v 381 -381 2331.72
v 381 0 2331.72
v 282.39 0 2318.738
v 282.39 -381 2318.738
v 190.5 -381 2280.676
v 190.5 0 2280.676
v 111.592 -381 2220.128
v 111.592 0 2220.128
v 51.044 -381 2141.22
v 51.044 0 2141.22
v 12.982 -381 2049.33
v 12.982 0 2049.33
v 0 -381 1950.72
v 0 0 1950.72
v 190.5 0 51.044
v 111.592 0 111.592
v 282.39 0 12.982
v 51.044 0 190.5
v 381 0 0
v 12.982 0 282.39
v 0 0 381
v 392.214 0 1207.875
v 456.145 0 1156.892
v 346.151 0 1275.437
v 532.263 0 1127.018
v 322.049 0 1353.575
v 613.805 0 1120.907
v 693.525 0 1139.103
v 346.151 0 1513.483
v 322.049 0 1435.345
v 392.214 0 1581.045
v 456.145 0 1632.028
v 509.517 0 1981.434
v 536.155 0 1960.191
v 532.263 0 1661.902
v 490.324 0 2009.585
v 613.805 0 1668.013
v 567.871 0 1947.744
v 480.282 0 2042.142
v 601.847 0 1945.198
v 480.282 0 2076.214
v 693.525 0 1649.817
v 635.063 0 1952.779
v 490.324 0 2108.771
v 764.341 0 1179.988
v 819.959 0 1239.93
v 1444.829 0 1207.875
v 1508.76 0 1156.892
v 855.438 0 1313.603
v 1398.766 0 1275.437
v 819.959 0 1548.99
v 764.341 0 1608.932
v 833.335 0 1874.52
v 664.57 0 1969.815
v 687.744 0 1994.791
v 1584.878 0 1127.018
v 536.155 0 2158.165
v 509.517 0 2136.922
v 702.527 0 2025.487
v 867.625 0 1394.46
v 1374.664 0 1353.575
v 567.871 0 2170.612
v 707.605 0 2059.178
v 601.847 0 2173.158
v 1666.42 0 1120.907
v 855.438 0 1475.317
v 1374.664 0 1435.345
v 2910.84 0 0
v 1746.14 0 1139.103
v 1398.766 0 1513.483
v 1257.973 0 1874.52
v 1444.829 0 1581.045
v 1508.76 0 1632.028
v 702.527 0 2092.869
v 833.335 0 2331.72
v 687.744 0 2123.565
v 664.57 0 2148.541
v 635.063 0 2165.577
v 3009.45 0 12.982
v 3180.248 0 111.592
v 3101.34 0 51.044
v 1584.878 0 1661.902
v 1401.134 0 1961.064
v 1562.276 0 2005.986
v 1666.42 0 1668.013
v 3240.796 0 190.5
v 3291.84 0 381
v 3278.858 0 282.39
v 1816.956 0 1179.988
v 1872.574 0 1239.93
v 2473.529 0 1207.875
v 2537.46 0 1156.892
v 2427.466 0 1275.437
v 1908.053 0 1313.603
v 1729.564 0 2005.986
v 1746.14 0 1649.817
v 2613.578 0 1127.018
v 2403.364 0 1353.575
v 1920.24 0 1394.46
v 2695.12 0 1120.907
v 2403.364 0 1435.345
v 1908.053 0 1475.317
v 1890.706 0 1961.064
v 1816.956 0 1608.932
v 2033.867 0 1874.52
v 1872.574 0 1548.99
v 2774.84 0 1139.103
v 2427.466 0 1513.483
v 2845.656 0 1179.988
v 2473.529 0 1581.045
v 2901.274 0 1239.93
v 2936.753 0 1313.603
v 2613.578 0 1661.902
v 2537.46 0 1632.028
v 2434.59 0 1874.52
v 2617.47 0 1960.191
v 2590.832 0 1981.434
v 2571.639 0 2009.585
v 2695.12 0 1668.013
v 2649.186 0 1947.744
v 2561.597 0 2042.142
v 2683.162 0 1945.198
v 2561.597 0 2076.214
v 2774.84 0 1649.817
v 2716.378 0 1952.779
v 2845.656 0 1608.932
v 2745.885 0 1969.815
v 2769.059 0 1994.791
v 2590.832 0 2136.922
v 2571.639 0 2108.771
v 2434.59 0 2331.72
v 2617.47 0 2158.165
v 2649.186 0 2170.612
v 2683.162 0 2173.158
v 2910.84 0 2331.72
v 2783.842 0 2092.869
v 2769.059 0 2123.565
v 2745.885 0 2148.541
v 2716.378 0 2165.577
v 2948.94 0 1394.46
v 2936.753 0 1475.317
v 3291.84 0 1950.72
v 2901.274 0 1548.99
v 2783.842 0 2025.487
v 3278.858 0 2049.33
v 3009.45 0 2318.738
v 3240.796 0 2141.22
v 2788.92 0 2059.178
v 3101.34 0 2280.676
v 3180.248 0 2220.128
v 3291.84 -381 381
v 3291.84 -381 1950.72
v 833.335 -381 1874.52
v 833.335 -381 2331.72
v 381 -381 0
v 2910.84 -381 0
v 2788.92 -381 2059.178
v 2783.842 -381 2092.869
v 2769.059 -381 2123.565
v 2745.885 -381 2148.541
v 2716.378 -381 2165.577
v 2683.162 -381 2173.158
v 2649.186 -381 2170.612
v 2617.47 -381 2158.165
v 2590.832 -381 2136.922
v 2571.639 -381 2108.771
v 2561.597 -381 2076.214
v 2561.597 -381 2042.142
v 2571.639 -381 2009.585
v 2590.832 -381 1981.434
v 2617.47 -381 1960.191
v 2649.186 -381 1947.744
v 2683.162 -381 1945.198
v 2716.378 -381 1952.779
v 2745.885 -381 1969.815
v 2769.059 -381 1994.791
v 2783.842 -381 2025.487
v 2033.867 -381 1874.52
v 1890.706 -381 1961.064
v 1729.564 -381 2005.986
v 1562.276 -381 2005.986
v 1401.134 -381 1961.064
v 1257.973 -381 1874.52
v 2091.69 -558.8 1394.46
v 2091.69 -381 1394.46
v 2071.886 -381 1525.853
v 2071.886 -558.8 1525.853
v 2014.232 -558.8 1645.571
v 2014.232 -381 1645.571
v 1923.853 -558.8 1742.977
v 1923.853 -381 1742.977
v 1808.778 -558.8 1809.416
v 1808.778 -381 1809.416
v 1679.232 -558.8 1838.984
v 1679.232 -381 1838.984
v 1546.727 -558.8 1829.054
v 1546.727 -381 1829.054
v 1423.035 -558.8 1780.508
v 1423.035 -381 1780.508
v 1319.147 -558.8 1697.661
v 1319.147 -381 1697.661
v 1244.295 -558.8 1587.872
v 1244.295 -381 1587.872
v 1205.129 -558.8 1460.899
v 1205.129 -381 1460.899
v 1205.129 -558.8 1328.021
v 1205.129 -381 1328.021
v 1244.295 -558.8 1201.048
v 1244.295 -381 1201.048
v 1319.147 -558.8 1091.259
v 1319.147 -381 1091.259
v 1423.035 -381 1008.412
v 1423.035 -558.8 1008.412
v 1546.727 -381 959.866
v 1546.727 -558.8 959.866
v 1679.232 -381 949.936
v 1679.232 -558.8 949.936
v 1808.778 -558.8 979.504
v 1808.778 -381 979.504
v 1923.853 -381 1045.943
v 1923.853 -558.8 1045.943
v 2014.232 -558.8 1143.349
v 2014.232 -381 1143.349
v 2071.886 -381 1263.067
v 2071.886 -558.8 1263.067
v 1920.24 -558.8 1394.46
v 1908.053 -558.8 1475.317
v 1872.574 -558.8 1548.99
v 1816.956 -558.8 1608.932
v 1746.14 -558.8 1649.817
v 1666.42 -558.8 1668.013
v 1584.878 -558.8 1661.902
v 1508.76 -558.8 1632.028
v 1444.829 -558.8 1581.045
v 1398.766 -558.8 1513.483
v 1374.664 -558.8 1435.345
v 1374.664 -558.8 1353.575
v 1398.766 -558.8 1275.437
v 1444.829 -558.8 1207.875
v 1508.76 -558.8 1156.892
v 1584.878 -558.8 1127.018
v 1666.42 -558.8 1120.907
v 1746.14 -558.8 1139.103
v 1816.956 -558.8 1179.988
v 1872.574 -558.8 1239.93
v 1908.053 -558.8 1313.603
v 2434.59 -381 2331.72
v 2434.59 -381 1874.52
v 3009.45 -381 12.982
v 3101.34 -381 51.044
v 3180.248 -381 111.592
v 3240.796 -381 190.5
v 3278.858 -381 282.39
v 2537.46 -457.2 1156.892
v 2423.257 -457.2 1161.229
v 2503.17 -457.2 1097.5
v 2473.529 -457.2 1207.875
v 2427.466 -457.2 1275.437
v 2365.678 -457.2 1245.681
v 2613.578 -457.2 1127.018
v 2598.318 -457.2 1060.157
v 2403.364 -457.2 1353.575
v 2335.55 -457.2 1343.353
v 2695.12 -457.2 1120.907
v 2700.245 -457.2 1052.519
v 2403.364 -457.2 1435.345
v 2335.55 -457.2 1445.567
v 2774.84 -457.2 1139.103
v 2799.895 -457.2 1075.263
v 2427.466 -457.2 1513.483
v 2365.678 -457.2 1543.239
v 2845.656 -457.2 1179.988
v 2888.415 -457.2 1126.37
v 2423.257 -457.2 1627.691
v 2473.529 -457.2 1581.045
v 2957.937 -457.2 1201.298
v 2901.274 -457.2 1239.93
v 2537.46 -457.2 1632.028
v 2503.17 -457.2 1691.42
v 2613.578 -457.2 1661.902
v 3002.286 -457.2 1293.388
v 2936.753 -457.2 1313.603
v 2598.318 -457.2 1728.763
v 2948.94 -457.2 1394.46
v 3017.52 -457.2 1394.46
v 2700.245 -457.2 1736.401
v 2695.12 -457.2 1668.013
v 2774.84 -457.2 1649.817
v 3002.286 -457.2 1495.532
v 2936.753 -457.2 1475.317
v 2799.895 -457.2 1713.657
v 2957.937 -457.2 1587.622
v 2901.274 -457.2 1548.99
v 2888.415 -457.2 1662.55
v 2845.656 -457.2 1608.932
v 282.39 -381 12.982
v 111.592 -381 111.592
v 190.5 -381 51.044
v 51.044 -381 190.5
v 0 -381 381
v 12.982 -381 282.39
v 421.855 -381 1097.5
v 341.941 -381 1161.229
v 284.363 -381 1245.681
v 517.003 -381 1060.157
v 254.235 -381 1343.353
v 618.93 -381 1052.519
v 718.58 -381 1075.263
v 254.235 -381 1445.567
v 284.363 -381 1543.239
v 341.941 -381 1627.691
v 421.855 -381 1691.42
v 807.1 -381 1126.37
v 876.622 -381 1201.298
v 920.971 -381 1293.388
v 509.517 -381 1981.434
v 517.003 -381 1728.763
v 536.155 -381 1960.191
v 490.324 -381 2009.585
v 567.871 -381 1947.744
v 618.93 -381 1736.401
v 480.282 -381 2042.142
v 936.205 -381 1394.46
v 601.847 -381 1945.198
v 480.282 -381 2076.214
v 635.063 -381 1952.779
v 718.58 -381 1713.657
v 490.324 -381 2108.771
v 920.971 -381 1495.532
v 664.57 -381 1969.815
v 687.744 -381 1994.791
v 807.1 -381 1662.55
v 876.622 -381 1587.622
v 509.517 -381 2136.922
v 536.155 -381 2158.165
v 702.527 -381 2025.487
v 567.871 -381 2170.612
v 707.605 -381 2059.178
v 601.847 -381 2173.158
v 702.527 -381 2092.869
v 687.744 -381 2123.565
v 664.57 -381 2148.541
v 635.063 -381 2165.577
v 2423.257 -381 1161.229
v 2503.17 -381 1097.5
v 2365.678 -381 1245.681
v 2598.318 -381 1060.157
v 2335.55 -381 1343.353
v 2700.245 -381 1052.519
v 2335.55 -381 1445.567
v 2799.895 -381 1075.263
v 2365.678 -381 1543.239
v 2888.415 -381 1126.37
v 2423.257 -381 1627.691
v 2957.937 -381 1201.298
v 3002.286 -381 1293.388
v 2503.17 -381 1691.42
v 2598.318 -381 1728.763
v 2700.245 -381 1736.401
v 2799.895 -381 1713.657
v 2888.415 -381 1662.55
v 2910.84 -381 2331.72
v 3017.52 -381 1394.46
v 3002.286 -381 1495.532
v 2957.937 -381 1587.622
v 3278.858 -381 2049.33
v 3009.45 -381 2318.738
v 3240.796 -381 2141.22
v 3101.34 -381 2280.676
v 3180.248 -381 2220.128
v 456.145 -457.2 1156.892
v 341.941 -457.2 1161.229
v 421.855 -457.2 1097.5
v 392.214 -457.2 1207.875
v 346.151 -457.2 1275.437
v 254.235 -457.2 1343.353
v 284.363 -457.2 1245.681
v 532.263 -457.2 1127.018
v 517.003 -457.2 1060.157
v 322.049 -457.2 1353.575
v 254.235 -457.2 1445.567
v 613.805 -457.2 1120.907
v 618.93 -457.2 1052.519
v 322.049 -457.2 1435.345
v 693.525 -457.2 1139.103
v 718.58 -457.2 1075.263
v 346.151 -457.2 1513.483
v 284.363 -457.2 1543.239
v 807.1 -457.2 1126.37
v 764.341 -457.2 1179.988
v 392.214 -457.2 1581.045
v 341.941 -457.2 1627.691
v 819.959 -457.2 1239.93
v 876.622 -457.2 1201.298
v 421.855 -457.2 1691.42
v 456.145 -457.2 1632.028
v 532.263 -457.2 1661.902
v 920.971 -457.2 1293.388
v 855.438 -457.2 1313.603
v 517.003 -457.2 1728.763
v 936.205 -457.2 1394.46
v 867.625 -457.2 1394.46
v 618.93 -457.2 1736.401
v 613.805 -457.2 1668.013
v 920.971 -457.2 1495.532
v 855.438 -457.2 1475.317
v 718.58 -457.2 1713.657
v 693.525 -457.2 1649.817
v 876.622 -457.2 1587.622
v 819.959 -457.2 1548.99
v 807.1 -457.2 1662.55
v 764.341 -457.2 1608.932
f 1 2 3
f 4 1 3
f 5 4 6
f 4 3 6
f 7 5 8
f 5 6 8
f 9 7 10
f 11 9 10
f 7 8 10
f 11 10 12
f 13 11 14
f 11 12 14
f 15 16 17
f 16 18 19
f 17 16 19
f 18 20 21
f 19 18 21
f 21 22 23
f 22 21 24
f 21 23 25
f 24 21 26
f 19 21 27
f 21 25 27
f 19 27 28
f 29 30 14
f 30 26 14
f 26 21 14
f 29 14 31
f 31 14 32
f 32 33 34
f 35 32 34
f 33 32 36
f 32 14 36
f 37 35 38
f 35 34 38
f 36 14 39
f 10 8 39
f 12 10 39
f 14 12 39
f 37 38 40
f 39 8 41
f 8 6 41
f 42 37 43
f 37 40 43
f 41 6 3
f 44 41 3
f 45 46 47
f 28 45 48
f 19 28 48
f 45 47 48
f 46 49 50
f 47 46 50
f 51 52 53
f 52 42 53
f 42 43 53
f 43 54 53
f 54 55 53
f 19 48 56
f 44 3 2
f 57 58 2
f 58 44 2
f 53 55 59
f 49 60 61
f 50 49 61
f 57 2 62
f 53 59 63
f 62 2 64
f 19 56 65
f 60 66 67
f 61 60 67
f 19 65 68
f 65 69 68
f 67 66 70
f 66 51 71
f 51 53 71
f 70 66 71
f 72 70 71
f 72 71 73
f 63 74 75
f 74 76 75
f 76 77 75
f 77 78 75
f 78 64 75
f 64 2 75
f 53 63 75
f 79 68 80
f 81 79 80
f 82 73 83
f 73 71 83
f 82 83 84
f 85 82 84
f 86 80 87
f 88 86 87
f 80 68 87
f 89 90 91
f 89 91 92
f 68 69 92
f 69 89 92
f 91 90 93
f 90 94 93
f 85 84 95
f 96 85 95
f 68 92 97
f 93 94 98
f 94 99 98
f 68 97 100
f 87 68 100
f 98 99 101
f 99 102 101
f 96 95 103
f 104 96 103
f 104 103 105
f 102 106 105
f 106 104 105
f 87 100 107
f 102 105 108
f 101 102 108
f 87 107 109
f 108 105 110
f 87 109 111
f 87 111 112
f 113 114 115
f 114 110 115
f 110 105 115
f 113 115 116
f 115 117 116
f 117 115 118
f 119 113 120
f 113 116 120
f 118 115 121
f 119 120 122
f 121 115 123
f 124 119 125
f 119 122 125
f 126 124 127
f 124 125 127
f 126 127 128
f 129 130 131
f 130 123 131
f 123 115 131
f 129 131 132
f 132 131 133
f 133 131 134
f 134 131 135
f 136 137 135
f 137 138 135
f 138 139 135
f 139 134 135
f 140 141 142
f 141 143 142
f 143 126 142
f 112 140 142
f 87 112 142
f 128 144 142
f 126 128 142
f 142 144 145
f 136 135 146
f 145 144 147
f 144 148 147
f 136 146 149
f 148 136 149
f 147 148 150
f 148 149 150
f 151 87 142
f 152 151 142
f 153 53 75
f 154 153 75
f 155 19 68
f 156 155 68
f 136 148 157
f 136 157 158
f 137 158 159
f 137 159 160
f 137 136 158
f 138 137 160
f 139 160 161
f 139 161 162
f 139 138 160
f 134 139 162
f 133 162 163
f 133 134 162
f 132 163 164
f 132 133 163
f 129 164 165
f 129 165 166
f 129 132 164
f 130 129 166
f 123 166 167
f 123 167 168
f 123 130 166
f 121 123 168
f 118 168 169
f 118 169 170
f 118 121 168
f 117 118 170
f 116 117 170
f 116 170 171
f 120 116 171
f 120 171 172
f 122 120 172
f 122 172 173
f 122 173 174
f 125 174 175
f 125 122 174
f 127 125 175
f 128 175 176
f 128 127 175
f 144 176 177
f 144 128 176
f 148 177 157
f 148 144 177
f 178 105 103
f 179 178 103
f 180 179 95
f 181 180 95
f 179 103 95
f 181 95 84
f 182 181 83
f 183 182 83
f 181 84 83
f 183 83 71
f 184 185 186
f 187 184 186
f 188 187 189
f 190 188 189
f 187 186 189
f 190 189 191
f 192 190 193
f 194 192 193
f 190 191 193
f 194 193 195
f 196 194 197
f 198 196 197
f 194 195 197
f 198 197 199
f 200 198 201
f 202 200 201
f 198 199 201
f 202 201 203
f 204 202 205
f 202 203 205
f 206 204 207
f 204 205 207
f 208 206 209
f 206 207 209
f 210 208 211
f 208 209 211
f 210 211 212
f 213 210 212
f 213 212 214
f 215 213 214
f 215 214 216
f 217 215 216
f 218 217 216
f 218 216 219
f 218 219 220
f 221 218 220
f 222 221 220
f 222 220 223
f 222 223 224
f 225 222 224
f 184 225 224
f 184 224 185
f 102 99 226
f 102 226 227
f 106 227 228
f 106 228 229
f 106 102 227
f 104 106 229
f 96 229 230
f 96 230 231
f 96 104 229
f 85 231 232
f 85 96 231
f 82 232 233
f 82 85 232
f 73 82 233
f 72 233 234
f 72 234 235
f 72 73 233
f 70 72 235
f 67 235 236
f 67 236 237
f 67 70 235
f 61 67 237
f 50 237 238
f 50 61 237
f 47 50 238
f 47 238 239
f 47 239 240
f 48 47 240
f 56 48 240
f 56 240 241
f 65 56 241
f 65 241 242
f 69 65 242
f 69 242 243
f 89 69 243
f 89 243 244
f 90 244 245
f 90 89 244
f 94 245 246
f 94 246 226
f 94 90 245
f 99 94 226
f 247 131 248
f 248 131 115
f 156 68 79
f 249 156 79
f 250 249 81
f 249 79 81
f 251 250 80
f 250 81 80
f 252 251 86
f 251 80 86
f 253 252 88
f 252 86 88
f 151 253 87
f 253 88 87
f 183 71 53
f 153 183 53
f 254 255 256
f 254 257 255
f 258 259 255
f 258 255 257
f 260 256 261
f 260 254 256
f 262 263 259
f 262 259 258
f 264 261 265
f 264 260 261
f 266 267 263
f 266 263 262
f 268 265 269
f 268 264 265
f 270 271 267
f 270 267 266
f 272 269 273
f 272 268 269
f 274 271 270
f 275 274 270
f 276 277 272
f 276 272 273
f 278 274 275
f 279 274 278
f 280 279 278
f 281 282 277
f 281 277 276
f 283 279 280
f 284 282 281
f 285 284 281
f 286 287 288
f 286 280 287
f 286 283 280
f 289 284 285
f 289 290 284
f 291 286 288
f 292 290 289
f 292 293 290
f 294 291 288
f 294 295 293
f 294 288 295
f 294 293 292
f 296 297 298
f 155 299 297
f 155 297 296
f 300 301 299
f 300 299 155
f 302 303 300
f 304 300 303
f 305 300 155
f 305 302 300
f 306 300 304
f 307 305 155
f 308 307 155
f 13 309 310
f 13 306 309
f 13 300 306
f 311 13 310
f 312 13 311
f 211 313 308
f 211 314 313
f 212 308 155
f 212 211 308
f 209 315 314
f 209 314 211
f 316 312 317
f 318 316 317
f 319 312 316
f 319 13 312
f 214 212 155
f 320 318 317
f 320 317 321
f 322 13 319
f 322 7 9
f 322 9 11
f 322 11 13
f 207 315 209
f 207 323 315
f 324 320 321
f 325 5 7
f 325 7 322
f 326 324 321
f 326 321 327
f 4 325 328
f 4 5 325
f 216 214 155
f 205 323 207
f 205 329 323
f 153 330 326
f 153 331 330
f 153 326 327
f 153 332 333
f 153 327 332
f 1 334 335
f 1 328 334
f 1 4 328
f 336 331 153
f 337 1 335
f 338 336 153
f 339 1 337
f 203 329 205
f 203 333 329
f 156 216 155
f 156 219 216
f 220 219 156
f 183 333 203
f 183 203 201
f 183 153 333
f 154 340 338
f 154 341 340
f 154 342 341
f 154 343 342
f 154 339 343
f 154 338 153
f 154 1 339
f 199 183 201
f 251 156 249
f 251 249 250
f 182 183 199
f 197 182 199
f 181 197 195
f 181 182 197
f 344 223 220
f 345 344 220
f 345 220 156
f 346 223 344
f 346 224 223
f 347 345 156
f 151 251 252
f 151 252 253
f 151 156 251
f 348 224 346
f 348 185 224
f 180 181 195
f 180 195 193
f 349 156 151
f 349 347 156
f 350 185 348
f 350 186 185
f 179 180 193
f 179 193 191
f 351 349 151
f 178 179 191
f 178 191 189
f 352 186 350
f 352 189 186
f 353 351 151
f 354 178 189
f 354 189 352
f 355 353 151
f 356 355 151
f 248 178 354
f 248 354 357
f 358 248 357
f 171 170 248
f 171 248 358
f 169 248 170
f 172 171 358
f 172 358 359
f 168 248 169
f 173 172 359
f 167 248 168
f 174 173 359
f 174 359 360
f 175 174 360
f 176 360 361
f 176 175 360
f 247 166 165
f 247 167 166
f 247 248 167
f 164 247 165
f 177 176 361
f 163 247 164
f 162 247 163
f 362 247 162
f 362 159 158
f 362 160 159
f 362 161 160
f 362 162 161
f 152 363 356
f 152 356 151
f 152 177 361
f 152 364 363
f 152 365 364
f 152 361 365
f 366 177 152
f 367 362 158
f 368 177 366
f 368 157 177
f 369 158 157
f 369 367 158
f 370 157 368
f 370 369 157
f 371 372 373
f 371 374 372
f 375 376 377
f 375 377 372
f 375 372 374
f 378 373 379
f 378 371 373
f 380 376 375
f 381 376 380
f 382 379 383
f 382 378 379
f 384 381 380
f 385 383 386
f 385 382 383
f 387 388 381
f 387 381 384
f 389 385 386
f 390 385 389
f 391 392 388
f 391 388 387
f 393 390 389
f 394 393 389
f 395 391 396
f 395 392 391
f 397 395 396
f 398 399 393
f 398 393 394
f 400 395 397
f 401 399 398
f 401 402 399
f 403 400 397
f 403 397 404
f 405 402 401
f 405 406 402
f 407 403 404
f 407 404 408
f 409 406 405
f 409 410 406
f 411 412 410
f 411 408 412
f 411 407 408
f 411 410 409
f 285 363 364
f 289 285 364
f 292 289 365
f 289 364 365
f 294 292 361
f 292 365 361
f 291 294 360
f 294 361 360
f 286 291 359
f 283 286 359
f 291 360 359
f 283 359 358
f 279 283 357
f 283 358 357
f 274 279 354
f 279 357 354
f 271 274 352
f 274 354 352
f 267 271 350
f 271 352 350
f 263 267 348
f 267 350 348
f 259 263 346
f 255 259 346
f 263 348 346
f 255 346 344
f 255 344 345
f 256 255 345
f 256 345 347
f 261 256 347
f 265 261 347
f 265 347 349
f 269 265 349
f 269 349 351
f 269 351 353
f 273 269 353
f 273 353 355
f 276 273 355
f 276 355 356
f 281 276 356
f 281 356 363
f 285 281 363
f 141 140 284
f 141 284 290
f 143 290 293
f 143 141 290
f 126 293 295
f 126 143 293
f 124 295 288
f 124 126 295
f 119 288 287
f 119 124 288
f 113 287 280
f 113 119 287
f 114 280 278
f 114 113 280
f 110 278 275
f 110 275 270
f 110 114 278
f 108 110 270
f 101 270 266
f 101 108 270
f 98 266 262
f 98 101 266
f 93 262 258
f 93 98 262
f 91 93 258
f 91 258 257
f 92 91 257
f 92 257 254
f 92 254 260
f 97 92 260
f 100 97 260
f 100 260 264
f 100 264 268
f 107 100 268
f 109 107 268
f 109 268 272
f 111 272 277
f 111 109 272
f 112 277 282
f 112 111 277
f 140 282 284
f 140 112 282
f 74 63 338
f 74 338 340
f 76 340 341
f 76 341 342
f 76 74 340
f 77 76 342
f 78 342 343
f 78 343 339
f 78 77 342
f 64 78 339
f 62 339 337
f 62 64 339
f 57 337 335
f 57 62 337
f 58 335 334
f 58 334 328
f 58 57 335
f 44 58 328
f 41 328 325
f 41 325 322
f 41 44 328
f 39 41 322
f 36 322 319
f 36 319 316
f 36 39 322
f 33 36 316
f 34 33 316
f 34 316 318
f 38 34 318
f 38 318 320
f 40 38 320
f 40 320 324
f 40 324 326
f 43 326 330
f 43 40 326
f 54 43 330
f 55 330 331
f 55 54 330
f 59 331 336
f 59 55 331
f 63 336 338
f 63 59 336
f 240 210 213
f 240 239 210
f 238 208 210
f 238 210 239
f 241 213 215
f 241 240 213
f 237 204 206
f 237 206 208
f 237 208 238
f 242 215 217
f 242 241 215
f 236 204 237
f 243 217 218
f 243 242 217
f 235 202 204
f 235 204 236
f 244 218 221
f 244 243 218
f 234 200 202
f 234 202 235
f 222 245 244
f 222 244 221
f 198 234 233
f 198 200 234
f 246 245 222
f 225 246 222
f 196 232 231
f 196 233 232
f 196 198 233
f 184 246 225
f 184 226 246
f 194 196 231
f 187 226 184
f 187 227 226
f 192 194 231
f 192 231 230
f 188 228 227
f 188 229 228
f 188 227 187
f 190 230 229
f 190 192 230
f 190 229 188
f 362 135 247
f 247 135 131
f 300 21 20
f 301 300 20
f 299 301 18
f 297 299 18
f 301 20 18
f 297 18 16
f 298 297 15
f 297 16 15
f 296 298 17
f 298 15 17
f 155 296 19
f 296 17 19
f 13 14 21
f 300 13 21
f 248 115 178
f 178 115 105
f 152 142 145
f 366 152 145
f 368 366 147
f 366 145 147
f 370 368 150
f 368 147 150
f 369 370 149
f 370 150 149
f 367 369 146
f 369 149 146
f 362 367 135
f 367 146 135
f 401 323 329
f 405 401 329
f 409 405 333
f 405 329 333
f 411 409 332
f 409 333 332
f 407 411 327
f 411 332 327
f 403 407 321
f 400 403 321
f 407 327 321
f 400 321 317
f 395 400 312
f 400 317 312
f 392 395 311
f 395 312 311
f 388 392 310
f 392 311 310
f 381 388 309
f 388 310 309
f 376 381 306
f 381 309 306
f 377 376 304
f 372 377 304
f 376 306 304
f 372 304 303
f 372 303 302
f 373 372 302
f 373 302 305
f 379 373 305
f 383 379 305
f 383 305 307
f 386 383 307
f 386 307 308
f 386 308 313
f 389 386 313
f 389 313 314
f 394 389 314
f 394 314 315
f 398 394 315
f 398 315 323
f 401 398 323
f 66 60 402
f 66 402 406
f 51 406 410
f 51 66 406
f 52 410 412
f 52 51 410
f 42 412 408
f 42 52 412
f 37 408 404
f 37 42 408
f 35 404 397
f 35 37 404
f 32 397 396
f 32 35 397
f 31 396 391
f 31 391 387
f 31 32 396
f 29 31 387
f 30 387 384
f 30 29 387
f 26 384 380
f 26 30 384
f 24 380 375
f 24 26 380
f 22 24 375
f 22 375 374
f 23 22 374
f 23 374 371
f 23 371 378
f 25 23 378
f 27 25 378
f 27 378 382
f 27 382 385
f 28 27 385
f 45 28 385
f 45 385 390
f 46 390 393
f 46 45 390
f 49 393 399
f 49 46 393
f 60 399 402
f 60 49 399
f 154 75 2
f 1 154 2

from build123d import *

# Parameters (mm, degrees)
F0_R     = 342.9
F0_R_2   = 114.3
F0_R_3   = 445.77
F1_DEPTH = 381
F0_R_4   = 274.32
F2_DEPTH = 558.8
F3_DEPTH = 457.2


with BuildPart() as f1:
    # F0 (on Front) → F1 (new body)
    with BuildSketch(Plane.XZ):
        with BuildLine():
            ThreePointArc((0, 381), (111.592316, 111.592316), (381, 0))
            Line((381, 0), (2910.84, 0))
            ThreePointArc((2910.84, 0), (3180.247684, 111.592316), (3291.84, 381))
            Line((3291.84, 381), (3291.84, 1950.72))
            ThreePointArc((3291.84, 1950.72), (3180.247684, 2220.127684), (2910.84, 2331.72))
            Line((2910.84, 2331.72), (2434.59, 2331.72))
            Line((2434.59, 2331.72), (2434.59, 1874.52))
            Line((2434.59, 1874.52), (2033.867064, 1874.52))
            ThreePointArc((2033.867064, 1874.52), (1645.92, 2011.68), (1257.972936, 1874.52))
            Line((1257.972936, 1874.52), (833.334932, 1874.52))
            Line((833.334932, 1874.52), (833.334932, 2331.72))
            Line((833.334932, 2331.72), (381, 2331.72))
            ThreePointArc((381, 2331.72), (111.592316, 2220.127684), (0, 1950.72))
            Line((0, 1950.72), (0, 381))
        make_face()
        with Locations((593.304932, 1394.46)):
            Circle(F0_R, mode=Mode.SUBTRACT)
        with Locations((593.304932, 2059.178)):
            Circle(F0_R_2, mode=Mode.SUBTRACT)
        with Locations((1645.92, 1394.46)):
            Circle(F0_R_3, mode=Mode.SUBTRACT)
        with Locations((2674.62, 1394.46)):
            Circle(F0_R, mode=Mode.SUBTRACT)
        with Locations((2674.62, 2059.178)):
            Circle(F0_R_2, mode=Mode.SUBTRACT)
    extrude(amount=F1_DEPTH)

    # F0 (on Front) → F2 (join)
    with BuildSketch(Plane.XZ):
        with Locations((1645.92, 1394.46)):
            Circle(F0_R_3)
        with Locations((1645.92, 1394.46)):
            Circle(F0_R_4, mode=Mode.SUBTRACT)
    extrude(amount=F2_DEPTH)

    # F0 (on Front) → F3 (join)
    with BuildSketch(Plane.XZ):
        with Locations((593.304932, 1394.46)):
            Circle(F0_R)
        with Locations((593.304932, 1394.46)):
            Circle(F0_R_4, mode=Mode.SUBTRACT)
        with Locations((2674.62, 1394.46)):
            Circle(F0_R)
        with Locations((2674.62, 1394.46)):
            Circle(F0_R_4, mode=Mode.SUBTRACT)
    extrude(amount=F3_DEPTH)


solid = f1.part
